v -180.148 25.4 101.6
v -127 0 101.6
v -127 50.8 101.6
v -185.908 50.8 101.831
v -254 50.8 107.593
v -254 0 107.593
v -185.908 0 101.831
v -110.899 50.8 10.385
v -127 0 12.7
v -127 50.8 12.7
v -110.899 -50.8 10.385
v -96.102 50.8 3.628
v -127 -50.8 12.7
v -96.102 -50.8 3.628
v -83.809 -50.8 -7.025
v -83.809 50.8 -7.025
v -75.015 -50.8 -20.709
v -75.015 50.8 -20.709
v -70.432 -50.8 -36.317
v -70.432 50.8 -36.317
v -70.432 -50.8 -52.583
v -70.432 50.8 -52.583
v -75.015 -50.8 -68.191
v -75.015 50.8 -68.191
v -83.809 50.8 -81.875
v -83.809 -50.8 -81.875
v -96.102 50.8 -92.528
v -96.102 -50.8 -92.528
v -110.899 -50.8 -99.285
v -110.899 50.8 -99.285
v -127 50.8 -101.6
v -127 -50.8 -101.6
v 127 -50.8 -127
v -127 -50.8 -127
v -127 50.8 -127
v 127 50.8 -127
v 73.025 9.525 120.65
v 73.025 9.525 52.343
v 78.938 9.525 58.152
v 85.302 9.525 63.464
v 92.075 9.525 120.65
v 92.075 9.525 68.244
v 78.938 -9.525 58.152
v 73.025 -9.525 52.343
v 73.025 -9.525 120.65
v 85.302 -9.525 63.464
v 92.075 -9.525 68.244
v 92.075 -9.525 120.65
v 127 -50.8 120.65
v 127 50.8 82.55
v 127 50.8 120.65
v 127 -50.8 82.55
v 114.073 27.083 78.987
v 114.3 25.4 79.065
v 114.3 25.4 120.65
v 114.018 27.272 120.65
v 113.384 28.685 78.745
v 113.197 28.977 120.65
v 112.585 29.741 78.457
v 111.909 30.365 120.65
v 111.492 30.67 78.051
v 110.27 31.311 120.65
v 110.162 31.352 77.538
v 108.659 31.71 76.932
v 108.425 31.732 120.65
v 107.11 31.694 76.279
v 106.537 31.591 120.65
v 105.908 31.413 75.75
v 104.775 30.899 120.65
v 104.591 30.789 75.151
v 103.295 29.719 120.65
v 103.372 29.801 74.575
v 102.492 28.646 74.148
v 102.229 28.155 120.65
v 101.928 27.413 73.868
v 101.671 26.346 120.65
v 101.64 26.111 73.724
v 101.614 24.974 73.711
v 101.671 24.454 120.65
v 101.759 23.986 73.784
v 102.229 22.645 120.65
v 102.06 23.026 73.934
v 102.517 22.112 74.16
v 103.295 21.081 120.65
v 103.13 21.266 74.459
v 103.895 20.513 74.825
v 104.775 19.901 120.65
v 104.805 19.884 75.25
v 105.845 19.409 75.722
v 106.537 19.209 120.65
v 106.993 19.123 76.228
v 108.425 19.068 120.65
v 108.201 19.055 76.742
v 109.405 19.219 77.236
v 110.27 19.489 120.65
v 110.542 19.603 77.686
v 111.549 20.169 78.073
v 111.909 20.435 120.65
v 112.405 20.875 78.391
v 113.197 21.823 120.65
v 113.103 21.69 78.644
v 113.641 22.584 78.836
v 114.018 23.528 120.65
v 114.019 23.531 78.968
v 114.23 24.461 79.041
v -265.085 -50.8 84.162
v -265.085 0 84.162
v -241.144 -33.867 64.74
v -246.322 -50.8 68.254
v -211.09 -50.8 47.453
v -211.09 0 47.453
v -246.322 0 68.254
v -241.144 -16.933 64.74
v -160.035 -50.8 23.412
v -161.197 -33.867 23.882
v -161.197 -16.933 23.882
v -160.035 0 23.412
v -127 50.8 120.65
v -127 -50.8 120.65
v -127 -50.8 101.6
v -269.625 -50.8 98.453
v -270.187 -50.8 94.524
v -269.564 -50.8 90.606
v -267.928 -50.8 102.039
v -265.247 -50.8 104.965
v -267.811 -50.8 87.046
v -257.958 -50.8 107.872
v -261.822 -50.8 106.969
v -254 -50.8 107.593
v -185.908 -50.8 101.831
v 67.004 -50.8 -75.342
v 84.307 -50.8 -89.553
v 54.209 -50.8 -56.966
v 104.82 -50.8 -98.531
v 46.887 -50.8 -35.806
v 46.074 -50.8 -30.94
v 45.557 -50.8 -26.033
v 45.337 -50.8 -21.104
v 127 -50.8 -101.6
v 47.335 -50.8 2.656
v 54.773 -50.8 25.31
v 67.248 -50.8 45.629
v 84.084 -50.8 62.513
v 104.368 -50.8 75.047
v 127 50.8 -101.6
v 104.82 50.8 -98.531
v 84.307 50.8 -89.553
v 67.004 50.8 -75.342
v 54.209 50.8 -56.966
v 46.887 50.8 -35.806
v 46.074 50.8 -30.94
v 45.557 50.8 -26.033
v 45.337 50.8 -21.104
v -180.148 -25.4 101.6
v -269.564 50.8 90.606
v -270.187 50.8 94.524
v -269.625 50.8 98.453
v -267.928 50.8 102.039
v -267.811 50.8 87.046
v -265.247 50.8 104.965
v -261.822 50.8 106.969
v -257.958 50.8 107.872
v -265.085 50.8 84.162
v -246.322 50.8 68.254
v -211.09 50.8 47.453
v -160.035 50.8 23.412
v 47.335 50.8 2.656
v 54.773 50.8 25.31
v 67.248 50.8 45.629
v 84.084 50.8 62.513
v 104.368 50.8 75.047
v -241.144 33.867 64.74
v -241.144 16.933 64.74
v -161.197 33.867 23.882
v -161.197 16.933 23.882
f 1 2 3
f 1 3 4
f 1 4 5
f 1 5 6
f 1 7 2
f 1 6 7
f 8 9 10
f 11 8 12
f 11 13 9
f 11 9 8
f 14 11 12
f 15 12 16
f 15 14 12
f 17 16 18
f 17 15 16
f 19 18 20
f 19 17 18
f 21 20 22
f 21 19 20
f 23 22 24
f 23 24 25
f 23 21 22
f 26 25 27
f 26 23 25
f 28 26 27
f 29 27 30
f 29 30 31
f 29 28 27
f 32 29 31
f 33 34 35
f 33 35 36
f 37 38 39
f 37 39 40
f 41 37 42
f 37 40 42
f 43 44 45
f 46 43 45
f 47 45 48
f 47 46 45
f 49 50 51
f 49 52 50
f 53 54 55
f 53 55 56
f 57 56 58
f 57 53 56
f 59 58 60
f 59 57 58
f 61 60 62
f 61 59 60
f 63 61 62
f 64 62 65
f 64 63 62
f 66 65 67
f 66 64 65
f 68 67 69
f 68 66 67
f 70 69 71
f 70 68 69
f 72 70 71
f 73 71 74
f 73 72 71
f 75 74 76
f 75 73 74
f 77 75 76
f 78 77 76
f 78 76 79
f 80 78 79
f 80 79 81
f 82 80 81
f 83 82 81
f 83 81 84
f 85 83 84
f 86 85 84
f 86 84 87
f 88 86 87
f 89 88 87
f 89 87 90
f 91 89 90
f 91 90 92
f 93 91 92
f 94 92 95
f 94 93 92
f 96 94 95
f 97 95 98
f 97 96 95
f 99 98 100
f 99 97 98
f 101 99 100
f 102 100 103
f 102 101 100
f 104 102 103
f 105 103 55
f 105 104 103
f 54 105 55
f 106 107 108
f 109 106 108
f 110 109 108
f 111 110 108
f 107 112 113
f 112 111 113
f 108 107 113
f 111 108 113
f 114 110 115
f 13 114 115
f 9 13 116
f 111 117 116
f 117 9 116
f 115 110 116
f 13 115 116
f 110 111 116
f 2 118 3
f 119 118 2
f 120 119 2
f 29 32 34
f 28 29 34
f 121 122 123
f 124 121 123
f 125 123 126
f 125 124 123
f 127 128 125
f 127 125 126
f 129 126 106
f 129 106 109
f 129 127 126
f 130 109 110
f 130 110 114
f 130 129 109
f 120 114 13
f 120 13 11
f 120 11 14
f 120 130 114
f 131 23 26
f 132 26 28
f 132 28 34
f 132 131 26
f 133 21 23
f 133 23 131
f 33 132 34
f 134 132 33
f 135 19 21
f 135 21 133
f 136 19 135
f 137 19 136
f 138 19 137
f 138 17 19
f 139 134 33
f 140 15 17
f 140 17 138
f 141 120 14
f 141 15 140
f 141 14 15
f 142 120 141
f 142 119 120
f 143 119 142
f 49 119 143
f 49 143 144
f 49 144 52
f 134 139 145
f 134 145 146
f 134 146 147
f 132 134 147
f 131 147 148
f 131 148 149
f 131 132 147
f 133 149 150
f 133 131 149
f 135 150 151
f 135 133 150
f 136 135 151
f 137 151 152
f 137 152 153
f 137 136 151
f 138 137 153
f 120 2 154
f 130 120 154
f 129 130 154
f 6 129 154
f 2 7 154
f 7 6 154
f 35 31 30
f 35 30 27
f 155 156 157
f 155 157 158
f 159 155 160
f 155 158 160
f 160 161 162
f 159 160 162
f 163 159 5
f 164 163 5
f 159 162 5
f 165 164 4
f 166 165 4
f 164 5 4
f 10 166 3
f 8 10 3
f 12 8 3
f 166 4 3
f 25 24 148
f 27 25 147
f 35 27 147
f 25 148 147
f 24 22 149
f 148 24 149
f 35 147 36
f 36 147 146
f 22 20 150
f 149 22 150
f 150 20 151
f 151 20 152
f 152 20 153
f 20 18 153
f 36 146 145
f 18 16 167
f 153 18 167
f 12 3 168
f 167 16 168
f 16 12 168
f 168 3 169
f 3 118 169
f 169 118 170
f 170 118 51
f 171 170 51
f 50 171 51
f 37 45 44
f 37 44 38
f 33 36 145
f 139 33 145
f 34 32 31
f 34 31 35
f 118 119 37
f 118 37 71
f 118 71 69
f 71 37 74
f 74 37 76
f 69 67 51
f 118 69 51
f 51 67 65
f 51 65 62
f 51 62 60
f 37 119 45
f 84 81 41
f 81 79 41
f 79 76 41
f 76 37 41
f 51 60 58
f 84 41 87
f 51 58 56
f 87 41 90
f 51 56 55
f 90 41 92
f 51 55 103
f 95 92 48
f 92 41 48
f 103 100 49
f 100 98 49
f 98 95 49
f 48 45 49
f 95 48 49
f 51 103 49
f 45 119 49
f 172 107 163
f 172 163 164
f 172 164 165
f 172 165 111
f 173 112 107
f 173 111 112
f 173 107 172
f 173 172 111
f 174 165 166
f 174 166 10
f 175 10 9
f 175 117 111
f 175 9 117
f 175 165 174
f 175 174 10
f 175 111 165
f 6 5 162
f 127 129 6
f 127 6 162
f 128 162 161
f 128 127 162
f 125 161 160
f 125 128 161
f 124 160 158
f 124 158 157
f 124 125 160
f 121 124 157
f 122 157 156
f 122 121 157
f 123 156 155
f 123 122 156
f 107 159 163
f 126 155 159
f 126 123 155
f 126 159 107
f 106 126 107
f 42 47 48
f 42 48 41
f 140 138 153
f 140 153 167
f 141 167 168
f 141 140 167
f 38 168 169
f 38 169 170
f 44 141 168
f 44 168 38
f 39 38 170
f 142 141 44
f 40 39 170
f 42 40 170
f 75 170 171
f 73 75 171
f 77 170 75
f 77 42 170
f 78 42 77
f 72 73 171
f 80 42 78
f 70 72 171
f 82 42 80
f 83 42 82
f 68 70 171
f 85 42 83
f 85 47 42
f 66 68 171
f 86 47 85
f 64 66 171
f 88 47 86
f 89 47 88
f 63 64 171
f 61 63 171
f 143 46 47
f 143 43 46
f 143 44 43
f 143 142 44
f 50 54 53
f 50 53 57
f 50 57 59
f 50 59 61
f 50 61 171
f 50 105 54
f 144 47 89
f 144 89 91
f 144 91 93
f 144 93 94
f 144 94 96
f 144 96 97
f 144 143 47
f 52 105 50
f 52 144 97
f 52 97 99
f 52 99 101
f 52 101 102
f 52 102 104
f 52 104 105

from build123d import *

# Parameters (mm, degrees)
F0_W     = 254
F0_H     = 19.05
F1_DEPTH = 50.8
F2_DEPTH = 50.8
F4_W     = 19.05
F4_H     = 19.05
F4_R     = 6.35
F5_DEPTH = 127
F7_DEPTH = 50.8


# Not quite as in the source:
# - a feature names something its author has since deleted; it is built from what else it names


with BuildPart() as f1:
    # F0 (on Front) → F1 (new body)
    with BuildSketch(Plane.XZ):
        with Locations((0, 111.1250000177)):
            Rectangle(F0_W, F0_H)
    extrude(amount=F1_DEPTH)

    # F0 (on Front) → F2 (join, through all)
    with BuildSketch(Plane.XZ):
        with BuildLine():
            Line((127, 82.5500000177), (127, 101.6000000177))
            Line((127, 101.6000000177), (-127, 101.6000000177))
            Line((-127, 101.6000000177), (-127, 12.7000000177))
            ThreePointArc((-127, 12.7000000177), (-69.8499999823, -44.45), (-127, -101.6000000177))
            Line((-127, -101.6000000177), (-127, -127.0000000177))
            Line((-127, -127.0000000177), (-101.6, -127.0000000177))
            Line((-101.6, -127.0000000177), (88.9, -127.0000000177))
            Line((88.9, -127.0000000177), (127, -127.0000000177))
            Line((127, -127.0000000177), (127, -101.6000000177))
            ThreePointArc((127, -101.6000000177), (75.1661658016, -83.0433945651), (46.8866745136, -35.8060751437))
            ThreePointArc((46.8866745136, -35.8060751437), (45.7784438509, -28.4901624232), (45.3368966297, -21.1039732713))
            ThreePointArc((45.3368966297, -21.1039732713), (67.248156143, 45.6292415321), (127, 82.5500000177))
        make_face()
    extrude(amount=F2_DEPTH)

    # F3: F1 across face


with BuildPart() as f1_1:
    add(f1.part)
    add(f1.part.mirror(Plane(origin=(-11.712184673, 0, 3.7973817679), x_dir=(1, 0, 0), z_dir=(0, 1, 0))))

    # F4 (on Top) → F5 (cut)
    with BuildSketch(Plane.XY):
        with Locations((82.55, 0)):
            Rectangle(F4_W, F4_H)
        with Locations((107.95, 25.4)):
            Circle(F4_R)
    extrude(amount=F5_DEPTH, mode=Mode.SUBTRACT)



with BuildPart() as f7:
    # F0 (on Front) → F7 (new body)
    with BuildSketch(Plane.XZ):
        with BuildLine():
            Line((-127, 12.7000000177), (-127, 101.6000000177))
            add(Edge.make_bspline(
                [(-127, 101.6000000177), (-143.1548670141, 101.1279175586), (-178.3487321582, 100.5000750149), (-235.9685551739, 104.8555928403), (-254, 107.5927615166)],
                knots=[0, 0, 0, 0, 0.4585605976, 1, 1, 1, 1], degree=3))
            ThreePointArc((-254, 107.5927615166), (-268.9111687536, 100.3097468732), (-265.0851011276, 84.1621011496))
            add(Edge.make_bspline(
                [(-265.0851011276, 84.1621011496), (-258.982913814, 78.2797981737), (-242.4670319791, 62.3590460812), (-161.6065585576, 21.8898515634), (-136.6674442933, 15.2672145631), (-127, 12.7000000177)],
                knots=[0, 0, 0, 0, 0.2640715847, 0.7147231864, 1, 1, 1, 1], degree=3))
        make_face()
    extrude(amount=F7_DEPTH)


with BuildPart() as f1_2:
    add(f1_1.part)

    add(f7.part)  # F6 merges F7
    # F6: F7 across plane
    add(f7.part.mirror(Plane.XZ))


solid = f1_2.part
